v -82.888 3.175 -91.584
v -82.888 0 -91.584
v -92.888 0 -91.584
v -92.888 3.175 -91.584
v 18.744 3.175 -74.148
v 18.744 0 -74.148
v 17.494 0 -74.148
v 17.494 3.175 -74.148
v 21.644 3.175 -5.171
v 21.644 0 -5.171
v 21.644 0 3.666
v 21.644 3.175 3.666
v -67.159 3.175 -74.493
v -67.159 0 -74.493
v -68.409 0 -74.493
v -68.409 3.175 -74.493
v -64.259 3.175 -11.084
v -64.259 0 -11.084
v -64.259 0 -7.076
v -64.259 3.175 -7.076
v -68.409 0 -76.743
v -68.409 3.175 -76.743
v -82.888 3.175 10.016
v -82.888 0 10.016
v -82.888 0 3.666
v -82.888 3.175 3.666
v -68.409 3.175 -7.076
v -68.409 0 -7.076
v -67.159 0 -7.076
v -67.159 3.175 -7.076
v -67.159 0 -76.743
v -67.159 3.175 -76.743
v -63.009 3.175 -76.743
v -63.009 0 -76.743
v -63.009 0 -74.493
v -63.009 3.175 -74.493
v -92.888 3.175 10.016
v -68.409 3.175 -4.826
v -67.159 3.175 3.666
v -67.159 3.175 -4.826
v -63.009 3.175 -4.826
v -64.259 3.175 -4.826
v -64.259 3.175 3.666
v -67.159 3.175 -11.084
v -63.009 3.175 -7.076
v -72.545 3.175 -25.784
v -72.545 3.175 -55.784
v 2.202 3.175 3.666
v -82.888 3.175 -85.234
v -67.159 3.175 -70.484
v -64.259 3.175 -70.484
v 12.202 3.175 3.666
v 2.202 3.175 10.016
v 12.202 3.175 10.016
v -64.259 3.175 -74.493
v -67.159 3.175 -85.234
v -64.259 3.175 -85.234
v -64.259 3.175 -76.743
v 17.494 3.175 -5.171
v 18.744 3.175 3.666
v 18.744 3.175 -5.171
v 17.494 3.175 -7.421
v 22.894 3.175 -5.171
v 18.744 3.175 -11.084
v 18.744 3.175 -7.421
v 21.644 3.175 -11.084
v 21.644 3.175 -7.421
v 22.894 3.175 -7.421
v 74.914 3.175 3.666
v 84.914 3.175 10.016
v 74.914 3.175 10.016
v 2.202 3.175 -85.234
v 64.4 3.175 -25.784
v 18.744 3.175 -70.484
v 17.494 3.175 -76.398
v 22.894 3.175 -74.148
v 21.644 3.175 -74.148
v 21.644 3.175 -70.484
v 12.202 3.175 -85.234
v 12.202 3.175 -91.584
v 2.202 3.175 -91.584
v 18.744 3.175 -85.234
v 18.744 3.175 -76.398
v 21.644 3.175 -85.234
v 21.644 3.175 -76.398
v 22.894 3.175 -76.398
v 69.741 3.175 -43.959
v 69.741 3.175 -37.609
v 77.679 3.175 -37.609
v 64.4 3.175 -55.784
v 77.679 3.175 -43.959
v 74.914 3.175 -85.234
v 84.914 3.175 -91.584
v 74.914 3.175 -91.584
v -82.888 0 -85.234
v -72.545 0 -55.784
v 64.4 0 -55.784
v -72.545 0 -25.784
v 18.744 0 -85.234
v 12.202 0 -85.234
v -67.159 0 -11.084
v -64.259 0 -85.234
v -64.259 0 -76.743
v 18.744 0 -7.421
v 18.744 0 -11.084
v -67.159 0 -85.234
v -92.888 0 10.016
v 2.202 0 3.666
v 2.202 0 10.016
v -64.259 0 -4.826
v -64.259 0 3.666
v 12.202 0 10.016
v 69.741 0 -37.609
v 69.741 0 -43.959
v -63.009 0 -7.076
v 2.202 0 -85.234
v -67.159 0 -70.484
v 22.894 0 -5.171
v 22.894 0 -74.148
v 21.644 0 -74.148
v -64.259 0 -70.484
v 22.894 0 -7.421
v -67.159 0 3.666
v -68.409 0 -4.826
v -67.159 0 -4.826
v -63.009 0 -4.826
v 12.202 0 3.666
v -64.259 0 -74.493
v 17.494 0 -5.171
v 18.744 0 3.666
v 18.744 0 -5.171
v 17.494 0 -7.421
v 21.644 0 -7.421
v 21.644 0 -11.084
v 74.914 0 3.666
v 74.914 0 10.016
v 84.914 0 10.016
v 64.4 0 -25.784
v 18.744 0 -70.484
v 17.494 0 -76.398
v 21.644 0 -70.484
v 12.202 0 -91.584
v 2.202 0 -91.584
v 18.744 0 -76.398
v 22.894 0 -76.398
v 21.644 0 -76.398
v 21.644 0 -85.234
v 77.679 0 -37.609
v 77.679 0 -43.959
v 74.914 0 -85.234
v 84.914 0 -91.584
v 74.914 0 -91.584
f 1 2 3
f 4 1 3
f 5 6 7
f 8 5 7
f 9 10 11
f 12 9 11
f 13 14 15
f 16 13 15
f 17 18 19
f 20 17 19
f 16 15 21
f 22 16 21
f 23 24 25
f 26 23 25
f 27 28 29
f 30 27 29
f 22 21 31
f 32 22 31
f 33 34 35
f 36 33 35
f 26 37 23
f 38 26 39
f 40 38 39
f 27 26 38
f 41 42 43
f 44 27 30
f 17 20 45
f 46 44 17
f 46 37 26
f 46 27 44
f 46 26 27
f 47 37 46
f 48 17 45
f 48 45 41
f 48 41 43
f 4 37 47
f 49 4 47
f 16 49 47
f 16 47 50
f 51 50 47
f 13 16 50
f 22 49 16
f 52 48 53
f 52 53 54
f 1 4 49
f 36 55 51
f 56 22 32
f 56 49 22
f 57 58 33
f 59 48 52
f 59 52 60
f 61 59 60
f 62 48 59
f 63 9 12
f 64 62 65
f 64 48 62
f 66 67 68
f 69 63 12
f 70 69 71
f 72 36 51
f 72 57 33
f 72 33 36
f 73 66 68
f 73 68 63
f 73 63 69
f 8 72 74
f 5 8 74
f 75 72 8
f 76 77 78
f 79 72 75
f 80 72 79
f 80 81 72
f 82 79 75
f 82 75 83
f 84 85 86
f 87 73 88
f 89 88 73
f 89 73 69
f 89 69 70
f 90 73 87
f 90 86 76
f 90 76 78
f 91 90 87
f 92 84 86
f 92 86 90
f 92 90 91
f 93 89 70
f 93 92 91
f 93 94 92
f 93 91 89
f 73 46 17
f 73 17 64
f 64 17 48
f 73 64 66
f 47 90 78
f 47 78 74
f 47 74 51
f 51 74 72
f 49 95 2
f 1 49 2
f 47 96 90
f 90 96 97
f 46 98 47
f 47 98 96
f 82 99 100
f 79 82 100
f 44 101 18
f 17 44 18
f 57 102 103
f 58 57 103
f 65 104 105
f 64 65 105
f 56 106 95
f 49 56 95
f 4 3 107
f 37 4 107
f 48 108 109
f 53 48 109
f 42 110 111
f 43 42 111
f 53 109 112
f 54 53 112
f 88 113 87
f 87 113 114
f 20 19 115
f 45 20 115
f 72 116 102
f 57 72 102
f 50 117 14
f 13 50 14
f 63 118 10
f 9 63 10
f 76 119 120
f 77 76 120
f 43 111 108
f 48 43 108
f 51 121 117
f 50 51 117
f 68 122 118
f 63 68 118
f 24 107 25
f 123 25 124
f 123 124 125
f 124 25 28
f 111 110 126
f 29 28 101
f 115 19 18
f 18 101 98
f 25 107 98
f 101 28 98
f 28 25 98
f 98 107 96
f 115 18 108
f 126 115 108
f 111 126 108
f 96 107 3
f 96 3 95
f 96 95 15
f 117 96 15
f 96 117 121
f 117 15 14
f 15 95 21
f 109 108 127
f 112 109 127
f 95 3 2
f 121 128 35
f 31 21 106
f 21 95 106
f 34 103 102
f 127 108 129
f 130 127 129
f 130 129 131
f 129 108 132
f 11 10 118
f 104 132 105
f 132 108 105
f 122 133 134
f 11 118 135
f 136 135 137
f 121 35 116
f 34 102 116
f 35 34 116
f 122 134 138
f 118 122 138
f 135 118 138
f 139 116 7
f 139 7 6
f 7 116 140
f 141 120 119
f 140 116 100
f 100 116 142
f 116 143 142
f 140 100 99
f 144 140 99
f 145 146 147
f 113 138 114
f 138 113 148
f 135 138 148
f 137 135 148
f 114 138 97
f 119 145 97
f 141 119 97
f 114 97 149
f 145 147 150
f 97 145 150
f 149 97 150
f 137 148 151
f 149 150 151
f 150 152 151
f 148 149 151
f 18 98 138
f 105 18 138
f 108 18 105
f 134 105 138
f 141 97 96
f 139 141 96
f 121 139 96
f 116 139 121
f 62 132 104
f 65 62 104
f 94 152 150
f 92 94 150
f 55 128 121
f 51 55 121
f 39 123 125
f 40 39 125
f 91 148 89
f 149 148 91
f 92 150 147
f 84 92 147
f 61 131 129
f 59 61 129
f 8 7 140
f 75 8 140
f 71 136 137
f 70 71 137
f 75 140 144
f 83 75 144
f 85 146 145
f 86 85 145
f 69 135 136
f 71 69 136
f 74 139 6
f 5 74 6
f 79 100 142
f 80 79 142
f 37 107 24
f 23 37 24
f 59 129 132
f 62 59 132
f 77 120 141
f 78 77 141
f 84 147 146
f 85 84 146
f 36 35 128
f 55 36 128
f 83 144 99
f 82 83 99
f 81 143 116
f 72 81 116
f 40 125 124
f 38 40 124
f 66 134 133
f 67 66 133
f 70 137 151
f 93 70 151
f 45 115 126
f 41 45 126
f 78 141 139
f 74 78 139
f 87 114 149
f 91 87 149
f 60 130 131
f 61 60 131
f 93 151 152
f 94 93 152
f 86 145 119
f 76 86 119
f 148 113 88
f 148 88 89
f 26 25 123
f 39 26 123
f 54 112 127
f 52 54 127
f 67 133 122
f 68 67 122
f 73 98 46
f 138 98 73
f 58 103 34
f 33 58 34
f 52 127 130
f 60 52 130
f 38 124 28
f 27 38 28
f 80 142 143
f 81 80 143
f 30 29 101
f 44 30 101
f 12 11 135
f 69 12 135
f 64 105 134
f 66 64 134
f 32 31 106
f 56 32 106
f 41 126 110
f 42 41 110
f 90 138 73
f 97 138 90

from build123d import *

# Parameters (mm, degrees)
SKETCH1_W      = 136.944523068
SKETCH1_H      = 30
SKETCH1_W_2    = 7.9375
SKETCH1_H_2    = 6.35
EXTRUDE1_DEPTH = 3.175


with BuildPart() as part:
    # Sketch1 → Extrude1 (new body)
    with BuildSketch(Plane(origin=(0, 0, 0), x_dir=(1, 0, 0), z_dir=(0, 1, 0))):
        Polygon((-67.158636898, 70.484310302), (-67.158636898, 74.492800404), (-68.408636898, 74.492800404), (-68.408636898, 76.742800404), (-67.158636898, 76.742800404), (-67.158636898, 85.234310302), (-82.88813161, 85.234310302), (-82.88813161, 91.584310302), (-92.88813161, 91.584310302), (-92.88813161, -10.015689698), (-82.88813161, -10.015689698), (-82.88813161, -3.665689698), (-67.158636898, -3.665689698), (-67.158636898, 4.825820201), (-68.408636898, 4.825820201), (-68.408636898, 7.075820201), (-67.158636898, 7.075820201), (-67.158636898, 11.084310302), (-64.258636898, 11.084310302), (-64.258636898, 7.075820201), (-63.008636898, 7.075820201), (-63.008636898, 4.825820201), (-64.258636898, 4.825820201), (-64.258636898, -3.665689698), (2.20186839, -3.665689698), (2.20186839, -10.015689698), (12.20186839, -10.015689698), (12.20186839, -3.665689698), (18.744143558, -3.665689698), (18.744143558, 5.171032224), (17.494143558, 5.171032224), (17.494143558, 7.421032224), (18.744143558, 7.421032224), (18.744143558, 11.084310302), (21.644143558, 11.084310302), (21.644143558, 7.421032224), (22.894143558, 7.421032224), (22.894143558, 5.171032224), (21.644143558, 5.171032224), (21.644143558, -3.665689698), (74.914143558, -3.665689698), (74.914143558, -10.015689698), (84.914143558, -10.015689698), (84.914143558, 91.584310302), (74.914143558, 91.584310302), (74.914143558, 85.234310302), (21.644143558, 85.234310302), (21.644143558, 76.397588381), (22.894143558, 76.397588381), (22.894143558, 74.147588381), (21.644143558, 74.147588381), (21.644143558, 70.484310302), (18.744143558, 70.484310302), (18.744143558, 74.147588381), (17.494143558, 74.147588381), (17.494143558, 76.397588381), (18.744143558, 76.397588381), (18.744143558, 85.234310302), (12.20186839, 85.234310302), (12.20186839, 91.584310302), (2.20186839, 91.584310302), (2.20186839, 85.234310302), (-64.258636898, 85.234310302), (-64.258636898, 76.742800404), (-63.008636898, 76.742800404), (-63.008636898, 74.492800404), (-64.258636898, 74.492800404), (-64.258636898, 70.484310302), align=None)
        with Locations((-4.072635431, 40.784310302)):
            Rectangle(SKETCH1_W, SKETCH1_H, mode=Mode.SUBTRACT)
        with Locations((73.709900913, 40.784310302)):
            Rectangle(SKETCH1_W_2, SKETCH1_H_2, mode=Mode.SUBTRACT)
    extrude(amount=EXTRUDE1_DEPTH)


solid = part.part
